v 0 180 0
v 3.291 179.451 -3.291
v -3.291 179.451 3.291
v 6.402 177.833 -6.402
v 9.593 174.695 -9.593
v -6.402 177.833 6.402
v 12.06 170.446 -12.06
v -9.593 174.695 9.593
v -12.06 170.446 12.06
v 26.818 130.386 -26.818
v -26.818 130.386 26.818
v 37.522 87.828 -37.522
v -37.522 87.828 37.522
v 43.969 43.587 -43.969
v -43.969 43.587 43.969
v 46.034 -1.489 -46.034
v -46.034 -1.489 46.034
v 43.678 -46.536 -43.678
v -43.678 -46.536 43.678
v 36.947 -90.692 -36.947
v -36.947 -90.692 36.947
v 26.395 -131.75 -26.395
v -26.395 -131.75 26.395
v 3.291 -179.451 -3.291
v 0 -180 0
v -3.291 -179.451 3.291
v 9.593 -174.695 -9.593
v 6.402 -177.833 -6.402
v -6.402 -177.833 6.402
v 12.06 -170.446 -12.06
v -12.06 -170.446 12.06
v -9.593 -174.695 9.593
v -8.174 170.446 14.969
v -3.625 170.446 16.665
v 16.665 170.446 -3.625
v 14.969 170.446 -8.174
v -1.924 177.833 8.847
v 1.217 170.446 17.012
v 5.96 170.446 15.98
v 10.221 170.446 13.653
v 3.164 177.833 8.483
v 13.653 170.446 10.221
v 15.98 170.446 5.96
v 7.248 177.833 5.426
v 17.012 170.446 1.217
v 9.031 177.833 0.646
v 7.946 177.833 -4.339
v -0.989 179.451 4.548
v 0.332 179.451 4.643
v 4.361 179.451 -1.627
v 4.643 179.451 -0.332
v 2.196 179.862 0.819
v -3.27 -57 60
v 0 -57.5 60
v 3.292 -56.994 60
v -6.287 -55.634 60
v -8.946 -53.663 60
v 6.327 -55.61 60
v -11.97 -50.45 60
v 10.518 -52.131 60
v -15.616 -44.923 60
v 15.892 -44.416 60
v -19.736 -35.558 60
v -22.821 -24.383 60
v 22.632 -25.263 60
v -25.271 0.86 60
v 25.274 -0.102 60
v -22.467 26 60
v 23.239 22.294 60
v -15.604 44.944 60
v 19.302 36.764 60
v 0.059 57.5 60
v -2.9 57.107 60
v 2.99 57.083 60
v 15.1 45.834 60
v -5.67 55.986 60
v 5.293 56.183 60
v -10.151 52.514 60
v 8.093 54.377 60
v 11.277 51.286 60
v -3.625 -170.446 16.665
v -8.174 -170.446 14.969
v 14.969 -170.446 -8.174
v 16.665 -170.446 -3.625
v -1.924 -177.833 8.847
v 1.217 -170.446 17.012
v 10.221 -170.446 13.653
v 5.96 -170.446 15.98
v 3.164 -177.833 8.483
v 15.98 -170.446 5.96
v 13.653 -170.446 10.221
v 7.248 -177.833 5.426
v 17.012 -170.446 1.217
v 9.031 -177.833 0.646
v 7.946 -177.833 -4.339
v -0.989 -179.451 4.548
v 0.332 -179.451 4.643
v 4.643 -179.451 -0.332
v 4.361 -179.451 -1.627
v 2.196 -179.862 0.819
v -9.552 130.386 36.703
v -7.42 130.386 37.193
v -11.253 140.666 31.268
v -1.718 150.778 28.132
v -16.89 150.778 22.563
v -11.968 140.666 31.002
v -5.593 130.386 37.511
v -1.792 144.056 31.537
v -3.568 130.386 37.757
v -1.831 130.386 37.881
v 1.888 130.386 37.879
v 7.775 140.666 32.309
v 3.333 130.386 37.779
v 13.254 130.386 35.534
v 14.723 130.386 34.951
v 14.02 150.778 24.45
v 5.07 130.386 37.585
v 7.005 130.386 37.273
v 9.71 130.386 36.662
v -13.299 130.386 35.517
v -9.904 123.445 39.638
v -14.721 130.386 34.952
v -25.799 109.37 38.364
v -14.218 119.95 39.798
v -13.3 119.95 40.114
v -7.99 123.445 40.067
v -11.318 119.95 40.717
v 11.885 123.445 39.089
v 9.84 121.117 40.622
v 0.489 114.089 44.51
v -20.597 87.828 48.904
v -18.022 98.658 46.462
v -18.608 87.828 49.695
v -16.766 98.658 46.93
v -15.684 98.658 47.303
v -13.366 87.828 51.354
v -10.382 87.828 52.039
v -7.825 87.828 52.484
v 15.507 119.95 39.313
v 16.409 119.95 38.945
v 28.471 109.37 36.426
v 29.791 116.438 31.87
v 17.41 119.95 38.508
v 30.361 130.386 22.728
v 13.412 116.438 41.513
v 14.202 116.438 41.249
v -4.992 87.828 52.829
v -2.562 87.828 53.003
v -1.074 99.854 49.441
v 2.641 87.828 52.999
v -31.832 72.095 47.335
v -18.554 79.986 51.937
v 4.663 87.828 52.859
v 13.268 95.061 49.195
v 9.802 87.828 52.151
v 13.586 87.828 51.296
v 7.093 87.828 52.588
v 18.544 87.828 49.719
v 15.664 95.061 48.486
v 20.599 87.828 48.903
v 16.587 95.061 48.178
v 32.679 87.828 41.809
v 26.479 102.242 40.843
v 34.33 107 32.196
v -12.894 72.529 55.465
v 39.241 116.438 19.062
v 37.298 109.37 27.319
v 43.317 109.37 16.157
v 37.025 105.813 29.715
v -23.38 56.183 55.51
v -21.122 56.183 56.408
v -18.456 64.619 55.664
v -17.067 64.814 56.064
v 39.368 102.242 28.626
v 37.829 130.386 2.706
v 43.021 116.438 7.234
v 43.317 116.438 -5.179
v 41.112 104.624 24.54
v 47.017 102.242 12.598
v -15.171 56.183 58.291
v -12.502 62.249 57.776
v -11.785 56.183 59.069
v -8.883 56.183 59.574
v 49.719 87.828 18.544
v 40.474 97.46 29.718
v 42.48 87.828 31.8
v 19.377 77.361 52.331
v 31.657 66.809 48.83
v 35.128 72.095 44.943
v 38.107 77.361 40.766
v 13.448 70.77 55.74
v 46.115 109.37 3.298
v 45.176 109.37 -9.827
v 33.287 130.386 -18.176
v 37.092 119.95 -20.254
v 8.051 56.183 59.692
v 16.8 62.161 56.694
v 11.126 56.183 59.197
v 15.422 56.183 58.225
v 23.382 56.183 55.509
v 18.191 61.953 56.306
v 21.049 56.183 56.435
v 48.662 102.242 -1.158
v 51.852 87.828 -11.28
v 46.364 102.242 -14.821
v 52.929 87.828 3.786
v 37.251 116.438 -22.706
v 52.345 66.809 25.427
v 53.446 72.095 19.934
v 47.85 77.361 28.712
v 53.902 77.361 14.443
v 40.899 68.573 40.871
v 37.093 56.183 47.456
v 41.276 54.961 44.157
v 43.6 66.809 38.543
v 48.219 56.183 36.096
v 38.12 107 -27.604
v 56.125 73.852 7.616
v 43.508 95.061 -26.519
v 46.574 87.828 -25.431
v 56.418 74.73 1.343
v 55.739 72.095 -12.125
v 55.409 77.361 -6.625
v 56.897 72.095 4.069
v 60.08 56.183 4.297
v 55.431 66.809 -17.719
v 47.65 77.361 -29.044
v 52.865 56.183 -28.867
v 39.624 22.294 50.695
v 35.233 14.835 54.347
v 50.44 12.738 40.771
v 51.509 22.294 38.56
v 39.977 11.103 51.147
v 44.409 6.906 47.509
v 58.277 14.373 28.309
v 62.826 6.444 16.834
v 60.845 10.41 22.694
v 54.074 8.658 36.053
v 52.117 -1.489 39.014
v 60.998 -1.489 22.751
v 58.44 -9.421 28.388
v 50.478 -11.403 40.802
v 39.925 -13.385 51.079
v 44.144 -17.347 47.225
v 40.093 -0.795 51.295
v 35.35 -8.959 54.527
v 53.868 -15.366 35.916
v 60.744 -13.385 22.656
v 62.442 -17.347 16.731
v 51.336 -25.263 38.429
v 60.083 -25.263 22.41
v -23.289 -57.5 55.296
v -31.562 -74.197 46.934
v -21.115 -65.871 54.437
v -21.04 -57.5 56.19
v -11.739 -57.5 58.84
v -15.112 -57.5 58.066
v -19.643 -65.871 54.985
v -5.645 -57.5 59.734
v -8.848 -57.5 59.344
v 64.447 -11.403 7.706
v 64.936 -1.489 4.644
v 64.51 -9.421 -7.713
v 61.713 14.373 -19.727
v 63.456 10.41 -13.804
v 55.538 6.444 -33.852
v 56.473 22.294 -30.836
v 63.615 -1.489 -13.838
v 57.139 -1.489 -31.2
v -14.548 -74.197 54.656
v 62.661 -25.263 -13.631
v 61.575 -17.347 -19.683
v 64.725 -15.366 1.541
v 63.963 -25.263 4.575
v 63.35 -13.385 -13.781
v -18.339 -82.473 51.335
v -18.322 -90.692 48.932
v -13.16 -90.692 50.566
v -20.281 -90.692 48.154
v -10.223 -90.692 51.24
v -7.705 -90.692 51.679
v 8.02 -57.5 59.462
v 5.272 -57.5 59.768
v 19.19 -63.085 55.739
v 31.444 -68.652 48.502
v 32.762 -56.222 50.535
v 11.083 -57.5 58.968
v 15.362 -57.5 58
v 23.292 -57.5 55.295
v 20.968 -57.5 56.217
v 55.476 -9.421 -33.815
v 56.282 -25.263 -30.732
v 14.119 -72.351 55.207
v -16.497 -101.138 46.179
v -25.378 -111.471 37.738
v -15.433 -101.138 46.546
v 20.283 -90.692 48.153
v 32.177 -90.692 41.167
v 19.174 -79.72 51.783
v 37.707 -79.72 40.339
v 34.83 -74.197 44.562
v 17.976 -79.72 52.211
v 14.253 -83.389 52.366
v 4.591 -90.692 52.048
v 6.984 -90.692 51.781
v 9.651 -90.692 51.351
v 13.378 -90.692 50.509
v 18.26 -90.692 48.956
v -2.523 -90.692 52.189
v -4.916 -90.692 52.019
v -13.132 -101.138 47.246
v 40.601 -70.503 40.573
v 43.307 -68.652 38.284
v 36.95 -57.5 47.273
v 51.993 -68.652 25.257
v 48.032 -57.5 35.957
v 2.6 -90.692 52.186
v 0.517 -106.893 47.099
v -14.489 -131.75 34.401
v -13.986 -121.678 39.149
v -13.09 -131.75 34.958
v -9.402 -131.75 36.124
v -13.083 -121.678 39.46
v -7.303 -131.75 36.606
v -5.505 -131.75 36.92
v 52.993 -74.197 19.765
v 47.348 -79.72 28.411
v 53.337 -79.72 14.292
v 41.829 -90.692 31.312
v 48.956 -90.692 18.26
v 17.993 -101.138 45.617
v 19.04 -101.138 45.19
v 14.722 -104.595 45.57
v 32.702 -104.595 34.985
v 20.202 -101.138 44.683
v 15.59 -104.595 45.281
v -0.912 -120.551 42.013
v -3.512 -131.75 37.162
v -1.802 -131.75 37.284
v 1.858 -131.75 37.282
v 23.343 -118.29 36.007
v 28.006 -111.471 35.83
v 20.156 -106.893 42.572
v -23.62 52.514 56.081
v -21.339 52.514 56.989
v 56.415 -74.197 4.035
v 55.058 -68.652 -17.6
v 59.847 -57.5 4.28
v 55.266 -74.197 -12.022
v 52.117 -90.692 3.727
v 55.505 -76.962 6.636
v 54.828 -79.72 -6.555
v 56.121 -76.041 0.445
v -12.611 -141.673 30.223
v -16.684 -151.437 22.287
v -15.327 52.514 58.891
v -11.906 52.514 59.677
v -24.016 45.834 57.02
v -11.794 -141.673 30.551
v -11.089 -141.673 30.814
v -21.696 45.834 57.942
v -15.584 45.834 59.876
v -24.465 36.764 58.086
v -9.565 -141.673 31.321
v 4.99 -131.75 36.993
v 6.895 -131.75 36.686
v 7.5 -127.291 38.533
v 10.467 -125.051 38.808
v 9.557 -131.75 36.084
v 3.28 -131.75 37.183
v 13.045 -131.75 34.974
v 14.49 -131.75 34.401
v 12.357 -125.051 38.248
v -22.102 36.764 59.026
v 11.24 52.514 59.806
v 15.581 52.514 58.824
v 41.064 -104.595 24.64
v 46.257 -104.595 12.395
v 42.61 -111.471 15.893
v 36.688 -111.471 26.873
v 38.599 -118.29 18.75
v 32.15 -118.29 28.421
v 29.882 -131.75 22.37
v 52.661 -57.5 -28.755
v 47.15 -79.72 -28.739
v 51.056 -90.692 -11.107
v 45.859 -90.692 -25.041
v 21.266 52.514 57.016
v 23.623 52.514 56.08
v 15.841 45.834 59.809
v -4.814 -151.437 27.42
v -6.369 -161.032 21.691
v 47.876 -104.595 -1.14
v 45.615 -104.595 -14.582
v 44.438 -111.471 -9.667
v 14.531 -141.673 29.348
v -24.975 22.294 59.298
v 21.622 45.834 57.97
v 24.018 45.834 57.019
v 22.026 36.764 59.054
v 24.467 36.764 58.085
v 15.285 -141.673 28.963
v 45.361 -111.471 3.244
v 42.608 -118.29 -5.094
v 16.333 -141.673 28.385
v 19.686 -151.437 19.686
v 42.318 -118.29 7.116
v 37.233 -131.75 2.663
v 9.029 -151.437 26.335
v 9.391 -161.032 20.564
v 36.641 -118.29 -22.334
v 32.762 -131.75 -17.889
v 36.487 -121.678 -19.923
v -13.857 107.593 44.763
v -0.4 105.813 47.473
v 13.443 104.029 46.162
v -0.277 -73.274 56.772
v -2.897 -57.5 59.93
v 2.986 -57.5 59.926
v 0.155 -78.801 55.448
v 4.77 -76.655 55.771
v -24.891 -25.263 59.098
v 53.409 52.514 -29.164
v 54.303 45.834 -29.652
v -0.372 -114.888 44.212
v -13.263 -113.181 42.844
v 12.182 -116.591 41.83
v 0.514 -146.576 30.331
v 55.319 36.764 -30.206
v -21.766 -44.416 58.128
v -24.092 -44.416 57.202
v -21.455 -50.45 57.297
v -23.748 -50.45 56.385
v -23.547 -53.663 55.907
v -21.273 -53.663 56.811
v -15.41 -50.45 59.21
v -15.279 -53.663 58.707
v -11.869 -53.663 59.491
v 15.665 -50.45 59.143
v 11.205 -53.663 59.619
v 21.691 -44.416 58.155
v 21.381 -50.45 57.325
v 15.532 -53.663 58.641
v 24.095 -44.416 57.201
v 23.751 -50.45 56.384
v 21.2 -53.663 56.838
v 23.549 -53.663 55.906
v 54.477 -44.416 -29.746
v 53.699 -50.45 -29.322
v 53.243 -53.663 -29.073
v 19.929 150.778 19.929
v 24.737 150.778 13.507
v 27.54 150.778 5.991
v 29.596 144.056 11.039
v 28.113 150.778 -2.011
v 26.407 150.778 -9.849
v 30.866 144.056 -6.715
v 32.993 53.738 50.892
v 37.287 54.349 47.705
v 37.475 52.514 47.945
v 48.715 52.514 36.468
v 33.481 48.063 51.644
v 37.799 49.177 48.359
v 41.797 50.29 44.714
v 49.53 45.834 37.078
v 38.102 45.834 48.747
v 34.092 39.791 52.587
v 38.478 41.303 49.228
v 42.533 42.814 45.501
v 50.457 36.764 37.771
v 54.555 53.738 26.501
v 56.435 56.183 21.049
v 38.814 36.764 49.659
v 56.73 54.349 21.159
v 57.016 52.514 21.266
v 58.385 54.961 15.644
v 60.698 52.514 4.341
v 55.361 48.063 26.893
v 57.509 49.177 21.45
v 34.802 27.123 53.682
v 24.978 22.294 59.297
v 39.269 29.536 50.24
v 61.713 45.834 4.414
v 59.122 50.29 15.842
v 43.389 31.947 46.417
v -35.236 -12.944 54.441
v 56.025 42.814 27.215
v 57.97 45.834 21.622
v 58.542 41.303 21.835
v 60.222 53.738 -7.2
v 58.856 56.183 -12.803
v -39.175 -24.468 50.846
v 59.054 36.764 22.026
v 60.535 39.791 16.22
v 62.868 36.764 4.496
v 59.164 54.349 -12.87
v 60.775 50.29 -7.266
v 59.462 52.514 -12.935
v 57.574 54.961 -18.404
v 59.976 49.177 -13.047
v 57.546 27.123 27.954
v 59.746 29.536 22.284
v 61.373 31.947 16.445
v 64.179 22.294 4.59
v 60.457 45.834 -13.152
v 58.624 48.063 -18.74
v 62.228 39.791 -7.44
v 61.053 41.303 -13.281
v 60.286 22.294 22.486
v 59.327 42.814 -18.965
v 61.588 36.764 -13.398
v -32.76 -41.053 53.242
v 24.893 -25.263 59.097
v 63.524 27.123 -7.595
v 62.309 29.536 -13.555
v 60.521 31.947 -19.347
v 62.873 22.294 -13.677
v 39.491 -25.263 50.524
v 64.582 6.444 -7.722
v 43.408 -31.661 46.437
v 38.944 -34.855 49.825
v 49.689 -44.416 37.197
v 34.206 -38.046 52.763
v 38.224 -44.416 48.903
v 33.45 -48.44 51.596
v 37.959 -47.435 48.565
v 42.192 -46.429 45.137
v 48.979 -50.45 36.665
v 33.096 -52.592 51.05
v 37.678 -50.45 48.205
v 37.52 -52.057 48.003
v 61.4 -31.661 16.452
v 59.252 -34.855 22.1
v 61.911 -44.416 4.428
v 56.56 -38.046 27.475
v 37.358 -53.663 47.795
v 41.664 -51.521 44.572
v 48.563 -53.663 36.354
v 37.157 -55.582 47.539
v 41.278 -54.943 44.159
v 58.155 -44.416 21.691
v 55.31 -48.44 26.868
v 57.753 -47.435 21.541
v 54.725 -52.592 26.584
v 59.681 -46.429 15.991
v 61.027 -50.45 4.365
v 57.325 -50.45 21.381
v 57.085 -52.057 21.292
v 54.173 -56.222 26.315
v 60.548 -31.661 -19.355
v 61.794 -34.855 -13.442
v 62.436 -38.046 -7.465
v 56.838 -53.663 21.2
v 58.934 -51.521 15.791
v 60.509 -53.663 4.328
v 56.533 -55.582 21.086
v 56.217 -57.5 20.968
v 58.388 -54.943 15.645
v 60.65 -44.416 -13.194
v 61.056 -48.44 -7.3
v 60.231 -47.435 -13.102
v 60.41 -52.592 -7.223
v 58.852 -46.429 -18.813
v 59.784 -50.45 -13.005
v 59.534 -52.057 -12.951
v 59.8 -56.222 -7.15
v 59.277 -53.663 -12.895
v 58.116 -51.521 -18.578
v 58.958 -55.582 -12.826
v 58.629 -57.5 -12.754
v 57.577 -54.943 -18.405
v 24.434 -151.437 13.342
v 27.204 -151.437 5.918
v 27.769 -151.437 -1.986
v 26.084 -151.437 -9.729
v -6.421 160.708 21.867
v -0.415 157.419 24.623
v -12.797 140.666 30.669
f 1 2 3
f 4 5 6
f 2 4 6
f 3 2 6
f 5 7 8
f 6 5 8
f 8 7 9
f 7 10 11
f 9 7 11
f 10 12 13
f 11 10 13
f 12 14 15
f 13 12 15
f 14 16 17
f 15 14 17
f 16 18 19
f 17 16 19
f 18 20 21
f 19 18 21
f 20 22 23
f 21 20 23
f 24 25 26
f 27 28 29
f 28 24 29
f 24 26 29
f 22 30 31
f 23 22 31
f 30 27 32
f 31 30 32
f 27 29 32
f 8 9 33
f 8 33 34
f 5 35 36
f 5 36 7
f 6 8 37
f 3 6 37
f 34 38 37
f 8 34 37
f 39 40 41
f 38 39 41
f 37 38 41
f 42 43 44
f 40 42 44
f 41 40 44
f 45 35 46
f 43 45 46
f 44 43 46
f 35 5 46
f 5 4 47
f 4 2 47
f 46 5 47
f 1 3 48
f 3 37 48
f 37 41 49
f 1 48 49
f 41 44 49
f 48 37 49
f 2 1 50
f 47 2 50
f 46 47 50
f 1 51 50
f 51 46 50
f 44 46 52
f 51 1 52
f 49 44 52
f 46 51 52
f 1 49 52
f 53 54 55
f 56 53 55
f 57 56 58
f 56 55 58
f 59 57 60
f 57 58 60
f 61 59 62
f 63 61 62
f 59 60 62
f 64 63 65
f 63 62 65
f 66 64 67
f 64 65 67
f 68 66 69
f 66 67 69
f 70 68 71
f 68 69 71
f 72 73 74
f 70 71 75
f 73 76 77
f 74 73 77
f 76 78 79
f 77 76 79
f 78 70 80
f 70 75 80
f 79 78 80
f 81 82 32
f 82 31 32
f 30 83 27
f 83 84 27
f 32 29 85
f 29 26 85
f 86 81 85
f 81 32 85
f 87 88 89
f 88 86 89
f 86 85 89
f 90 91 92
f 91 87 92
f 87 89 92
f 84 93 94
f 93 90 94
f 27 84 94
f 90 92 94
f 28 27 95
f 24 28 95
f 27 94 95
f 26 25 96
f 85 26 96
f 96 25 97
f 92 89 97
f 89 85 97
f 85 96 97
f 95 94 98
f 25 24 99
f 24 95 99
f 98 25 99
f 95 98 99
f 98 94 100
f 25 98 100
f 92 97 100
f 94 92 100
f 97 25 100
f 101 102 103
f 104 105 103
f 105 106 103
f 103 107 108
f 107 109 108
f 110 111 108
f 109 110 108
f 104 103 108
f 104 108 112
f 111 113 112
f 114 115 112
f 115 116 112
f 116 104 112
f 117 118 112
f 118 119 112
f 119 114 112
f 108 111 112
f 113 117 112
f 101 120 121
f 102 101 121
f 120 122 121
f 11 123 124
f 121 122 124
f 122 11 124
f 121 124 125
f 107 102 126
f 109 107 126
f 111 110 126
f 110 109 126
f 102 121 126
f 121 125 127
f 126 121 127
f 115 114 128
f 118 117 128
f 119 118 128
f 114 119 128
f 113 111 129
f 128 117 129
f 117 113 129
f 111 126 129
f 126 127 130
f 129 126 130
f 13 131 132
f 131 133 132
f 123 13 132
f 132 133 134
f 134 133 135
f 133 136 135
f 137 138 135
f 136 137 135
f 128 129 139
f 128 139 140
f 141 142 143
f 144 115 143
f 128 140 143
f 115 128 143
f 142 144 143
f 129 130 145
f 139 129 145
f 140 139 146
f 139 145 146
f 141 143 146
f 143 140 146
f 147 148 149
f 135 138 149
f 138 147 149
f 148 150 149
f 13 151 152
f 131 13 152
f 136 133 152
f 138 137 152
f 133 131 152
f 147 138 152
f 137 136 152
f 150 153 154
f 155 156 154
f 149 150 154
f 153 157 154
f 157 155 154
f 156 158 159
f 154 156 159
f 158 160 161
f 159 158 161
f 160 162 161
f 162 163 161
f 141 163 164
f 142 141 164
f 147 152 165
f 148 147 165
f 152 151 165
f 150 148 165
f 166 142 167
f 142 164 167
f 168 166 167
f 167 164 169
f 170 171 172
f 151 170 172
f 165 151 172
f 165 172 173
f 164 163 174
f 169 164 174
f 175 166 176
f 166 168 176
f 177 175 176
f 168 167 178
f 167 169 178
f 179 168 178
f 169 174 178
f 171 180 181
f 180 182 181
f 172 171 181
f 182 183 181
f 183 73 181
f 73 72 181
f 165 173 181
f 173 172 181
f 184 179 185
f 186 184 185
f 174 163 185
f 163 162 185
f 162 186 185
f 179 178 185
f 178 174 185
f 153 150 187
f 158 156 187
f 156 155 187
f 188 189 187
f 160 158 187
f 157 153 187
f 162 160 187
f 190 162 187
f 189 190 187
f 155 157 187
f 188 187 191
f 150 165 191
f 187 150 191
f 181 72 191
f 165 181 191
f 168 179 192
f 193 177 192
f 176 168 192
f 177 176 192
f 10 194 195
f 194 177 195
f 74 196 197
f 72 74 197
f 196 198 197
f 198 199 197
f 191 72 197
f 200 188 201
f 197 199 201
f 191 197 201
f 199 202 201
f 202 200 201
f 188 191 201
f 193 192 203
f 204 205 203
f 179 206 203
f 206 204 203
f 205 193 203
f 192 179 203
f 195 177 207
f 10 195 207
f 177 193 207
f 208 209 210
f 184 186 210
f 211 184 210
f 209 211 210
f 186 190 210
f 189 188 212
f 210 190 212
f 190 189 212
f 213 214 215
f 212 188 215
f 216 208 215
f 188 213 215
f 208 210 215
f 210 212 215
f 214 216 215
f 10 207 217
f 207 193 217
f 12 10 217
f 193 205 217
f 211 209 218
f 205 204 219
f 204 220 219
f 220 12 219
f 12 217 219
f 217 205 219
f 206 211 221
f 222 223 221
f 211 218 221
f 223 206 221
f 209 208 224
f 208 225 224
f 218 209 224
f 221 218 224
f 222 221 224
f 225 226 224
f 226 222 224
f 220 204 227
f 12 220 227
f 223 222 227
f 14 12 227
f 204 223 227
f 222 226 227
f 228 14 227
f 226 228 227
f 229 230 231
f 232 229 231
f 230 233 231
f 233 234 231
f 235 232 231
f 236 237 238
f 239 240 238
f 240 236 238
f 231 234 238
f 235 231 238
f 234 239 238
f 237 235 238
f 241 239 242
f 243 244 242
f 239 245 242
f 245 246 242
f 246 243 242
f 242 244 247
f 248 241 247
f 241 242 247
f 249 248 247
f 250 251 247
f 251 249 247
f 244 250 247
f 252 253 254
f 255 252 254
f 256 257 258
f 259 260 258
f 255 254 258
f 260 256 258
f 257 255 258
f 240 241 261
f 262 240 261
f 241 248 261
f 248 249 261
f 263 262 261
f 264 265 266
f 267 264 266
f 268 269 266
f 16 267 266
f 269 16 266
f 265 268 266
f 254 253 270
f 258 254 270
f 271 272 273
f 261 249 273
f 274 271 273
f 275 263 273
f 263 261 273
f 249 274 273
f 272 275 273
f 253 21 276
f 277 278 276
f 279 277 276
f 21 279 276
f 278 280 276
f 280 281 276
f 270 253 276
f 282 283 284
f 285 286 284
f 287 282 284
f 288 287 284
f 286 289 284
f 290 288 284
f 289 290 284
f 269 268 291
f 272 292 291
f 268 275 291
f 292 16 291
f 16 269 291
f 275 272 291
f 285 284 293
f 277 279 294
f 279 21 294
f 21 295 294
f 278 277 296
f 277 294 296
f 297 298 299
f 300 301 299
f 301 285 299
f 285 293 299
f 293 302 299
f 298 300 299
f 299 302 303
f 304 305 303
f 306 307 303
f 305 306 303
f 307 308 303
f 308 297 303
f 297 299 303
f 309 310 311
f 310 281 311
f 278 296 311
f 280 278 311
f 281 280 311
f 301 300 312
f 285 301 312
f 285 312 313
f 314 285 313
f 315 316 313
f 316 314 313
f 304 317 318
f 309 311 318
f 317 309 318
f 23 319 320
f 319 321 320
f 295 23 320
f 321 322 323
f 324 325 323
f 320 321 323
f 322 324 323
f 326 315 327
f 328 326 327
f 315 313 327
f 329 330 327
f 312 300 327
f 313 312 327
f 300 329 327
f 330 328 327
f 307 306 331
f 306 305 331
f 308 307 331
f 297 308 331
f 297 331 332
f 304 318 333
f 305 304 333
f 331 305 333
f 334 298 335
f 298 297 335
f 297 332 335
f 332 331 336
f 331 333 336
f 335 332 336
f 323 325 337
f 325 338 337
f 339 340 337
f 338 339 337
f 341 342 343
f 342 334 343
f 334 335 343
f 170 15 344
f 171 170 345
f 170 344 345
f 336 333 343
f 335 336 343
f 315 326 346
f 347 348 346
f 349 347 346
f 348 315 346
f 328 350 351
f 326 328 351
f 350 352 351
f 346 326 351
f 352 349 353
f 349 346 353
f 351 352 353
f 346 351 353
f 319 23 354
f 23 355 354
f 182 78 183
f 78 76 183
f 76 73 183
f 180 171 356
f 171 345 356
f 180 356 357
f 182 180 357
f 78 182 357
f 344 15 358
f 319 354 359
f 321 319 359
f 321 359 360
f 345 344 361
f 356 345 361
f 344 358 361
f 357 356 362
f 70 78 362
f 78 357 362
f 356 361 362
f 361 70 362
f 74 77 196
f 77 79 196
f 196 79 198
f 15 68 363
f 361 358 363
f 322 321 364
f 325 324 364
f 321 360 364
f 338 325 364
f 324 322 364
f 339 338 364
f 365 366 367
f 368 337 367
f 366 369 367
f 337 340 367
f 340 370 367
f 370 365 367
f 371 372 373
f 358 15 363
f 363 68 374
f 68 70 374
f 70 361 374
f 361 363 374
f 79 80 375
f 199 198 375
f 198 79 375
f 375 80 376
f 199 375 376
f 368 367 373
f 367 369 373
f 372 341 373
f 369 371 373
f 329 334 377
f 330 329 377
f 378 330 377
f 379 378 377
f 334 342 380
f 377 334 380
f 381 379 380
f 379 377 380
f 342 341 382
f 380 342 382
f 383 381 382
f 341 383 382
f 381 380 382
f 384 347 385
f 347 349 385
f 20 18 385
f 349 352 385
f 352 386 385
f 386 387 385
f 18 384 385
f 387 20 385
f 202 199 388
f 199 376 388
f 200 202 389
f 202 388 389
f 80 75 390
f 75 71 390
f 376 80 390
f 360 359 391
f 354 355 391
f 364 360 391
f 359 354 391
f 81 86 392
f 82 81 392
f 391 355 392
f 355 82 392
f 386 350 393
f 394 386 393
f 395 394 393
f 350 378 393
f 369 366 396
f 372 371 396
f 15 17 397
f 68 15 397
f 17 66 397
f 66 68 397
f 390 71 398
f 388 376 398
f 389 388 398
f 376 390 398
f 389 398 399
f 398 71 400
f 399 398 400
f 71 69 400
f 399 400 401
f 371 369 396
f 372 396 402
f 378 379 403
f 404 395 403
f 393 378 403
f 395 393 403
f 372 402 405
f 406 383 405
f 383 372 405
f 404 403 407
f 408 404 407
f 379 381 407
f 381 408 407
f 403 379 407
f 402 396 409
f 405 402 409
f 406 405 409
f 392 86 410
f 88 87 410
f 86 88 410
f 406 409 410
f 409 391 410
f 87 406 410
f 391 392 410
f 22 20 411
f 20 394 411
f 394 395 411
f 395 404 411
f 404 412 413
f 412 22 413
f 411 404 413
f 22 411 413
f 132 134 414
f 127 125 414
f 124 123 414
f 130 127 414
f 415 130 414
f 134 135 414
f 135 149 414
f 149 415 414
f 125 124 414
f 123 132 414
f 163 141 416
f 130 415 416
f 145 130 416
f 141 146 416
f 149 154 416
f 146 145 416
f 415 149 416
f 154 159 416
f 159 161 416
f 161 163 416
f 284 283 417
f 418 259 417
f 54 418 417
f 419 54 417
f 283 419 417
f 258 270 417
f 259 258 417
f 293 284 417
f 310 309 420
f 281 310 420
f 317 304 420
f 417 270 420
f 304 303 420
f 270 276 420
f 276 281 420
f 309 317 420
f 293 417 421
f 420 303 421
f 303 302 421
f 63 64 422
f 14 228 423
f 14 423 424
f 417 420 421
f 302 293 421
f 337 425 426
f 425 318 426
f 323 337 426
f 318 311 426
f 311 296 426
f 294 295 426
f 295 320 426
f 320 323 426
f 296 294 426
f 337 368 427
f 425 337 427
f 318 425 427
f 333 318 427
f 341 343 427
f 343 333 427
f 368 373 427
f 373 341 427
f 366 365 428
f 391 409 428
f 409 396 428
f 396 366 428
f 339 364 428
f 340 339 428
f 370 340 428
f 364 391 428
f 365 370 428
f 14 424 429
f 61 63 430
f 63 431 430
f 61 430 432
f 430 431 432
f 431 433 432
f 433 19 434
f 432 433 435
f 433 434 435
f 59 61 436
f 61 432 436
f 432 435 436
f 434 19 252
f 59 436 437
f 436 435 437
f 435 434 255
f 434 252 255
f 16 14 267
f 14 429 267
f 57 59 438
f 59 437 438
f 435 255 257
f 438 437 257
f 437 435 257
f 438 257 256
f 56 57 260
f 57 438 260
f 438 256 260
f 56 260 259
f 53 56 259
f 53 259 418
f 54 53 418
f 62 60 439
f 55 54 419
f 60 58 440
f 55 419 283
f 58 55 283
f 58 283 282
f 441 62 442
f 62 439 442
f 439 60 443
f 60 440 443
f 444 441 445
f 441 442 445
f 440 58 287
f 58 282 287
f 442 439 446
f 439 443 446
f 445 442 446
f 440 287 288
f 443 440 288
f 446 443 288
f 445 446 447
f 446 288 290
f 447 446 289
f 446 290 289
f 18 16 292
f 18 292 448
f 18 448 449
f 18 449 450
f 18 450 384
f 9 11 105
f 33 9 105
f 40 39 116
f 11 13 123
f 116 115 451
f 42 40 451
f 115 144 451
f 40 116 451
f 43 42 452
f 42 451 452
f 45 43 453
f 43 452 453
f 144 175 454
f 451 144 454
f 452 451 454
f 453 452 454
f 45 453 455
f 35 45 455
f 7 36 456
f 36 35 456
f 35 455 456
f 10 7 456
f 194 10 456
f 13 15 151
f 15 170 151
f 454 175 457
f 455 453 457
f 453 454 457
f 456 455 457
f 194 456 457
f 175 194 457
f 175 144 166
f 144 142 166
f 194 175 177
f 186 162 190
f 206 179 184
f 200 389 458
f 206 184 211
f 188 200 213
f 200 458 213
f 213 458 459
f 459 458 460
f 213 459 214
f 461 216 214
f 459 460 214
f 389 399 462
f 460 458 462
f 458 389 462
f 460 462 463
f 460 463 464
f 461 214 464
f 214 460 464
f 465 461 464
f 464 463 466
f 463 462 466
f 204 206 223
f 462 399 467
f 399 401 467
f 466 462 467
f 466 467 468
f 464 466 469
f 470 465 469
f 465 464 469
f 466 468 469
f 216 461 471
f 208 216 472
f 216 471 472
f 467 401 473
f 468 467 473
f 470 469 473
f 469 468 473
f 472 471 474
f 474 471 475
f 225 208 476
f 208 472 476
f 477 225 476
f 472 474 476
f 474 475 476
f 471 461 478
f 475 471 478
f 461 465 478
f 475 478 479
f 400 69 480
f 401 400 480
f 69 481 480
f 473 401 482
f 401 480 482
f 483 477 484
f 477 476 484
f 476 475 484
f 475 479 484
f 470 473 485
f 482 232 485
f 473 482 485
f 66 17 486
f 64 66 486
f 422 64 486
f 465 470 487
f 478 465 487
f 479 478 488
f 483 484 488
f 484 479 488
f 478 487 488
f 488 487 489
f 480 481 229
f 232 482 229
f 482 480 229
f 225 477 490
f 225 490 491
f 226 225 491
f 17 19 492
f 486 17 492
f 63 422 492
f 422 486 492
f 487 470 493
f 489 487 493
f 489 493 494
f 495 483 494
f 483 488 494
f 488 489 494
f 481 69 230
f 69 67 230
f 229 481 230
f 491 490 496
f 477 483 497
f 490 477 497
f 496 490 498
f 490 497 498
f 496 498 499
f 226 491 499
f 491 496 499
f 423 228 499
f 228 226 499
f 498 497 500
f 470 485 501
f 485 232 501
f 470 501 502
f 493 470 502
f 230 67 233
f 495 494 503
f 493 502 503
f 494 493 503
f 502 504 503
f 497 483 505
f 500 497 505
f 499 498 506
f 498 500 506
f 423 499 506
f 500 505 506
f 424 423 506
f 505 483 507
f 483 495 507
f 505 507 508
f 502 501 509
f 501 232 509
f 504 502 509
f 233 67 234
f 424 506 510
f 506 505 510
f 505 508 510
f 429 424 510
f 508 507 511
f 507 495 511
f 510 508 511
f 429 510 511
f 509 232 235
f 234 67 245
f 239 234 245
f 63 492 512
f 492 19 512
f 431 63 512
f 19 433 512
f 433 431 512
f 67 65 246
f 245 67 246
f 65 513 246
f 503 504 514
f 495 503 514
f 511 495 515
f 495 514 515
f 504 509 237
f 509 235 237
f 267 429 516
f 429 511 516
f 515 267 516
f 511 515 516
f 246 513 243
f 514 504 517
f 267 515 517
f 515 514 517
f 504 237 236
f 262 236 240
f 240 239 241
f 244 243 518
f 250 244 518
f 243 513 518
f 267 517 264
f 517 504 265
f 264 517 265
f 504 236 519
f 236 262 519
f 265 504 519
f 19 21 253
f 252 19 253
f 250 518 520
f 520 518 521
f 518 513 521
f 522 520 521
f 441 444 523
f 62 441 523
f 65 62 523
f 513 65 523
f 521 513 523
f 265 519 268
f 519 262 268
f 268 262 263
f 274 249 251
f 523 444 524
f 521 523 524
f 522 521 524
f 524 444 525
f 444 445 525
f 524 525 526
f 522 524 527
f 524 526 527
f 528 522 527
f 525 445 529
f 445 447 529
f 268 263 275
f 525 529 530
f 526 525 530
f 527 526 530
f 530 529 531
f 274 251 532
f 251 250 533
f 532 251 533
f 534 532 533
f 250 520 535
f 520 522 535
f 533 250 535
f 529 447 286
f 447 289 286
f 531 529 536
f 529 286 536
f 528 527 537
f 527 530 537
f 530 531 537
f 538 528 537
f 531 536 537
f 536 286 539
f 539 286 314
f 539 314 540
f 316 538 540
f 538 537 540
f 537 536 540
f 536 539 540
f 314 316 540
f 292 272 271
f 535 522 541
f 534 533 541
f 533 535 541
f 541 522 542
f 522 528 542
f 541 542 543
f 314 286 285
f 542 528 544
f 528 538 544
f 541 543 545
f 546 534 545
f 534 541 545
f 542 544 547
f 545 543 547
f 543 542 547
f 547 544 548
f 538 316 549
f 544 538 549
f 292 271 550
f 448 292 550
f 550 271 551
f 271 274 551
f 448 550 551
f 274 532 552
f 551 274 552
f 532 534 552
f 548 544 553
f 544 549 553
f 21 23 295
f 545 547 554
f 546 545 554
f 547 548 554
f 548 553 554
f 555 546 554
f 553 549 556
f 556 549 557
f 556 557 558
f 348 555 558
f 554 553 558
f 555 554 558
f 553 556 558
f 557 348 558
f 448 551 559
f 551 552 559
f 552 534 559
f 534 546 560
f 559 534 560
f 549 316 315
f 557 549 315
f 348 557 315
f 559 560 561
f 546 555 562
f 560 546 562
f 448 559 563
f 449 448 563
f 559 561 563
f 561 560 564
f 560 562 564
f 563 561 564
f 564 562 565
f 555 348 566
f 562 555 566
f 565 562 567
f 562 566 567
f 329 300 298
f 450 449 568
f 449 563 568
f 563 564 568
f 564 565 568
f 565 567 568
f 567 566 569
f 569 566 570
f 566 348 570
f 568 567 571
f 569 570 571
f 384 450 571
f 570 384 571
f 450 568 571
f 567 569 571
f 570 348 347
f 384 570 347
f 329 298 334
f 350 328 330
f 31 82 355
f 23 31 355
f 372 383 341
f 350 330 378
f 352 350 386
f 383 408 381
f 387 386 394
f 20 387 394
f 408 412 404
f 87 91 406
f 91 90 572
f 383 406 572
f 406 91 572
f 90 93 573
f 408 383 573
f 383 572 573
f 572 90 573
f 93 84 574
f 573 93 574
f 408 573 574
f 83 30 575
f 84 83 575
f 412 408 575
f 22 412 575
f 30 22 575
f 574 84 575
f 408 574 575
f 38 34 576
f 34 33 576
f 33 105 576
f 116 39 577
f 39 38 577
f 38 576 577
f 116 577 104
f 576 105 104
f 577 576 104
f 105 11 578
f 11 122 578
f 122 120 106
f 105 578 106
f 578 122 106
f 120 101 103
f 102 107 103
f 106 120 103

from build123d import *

# Parameters (mm, degrees)
F2_W     = 150
F2_H     = 10
F3_DEPTH = 50
F5_DEPTH = 203


with BuildPart() as f1:
    # F0 (on Right) → F1 (revolve)
    with BuildSketch(Plane.YZ):
        with BuildLine():
            ThreePointArc((-170.446234, 17.055093), (-177.448849, 9.774337), (-180, 0))
            Line((-180, 0), (180, 0))
            ThreePointArc((180, 0), (177.448849, 9.774337), (170.446234, 17.055093))
            ThreePointArc((170.446234, 17.055093), (0, 65.105742), (-170.446234, 17.055093))
        make_face()
    revolve(axis=Axis((0, 0, 0), (0, 1, 0)))

    # F2 (on Right) → F3 (cut, symmetric)
    with BuildSketch(Plane.YZ):
        with Locations((0, -65)):
            Rectangle(F2_W, F2_H)
        Polygon((75, 70), (-75, 70), (-75, 60), (0, 60), (75, 60), align=None)
    extrude(amount=F3_DEPTH, both=True, mode=Mode.SUBTRACT)

    # F4 (on Front) → F5 (cut, symmetric)
    with BuildSketch(Plane.XZ):
        Polygon((68.942911, -68.942911), (-68.942911, 68.942911), (-68.942911, -68.942911), align=None)
    extrude(amount=F5_DEPTH, both=True, mode=Mode.SUBTRACT)


solid = f1.part
